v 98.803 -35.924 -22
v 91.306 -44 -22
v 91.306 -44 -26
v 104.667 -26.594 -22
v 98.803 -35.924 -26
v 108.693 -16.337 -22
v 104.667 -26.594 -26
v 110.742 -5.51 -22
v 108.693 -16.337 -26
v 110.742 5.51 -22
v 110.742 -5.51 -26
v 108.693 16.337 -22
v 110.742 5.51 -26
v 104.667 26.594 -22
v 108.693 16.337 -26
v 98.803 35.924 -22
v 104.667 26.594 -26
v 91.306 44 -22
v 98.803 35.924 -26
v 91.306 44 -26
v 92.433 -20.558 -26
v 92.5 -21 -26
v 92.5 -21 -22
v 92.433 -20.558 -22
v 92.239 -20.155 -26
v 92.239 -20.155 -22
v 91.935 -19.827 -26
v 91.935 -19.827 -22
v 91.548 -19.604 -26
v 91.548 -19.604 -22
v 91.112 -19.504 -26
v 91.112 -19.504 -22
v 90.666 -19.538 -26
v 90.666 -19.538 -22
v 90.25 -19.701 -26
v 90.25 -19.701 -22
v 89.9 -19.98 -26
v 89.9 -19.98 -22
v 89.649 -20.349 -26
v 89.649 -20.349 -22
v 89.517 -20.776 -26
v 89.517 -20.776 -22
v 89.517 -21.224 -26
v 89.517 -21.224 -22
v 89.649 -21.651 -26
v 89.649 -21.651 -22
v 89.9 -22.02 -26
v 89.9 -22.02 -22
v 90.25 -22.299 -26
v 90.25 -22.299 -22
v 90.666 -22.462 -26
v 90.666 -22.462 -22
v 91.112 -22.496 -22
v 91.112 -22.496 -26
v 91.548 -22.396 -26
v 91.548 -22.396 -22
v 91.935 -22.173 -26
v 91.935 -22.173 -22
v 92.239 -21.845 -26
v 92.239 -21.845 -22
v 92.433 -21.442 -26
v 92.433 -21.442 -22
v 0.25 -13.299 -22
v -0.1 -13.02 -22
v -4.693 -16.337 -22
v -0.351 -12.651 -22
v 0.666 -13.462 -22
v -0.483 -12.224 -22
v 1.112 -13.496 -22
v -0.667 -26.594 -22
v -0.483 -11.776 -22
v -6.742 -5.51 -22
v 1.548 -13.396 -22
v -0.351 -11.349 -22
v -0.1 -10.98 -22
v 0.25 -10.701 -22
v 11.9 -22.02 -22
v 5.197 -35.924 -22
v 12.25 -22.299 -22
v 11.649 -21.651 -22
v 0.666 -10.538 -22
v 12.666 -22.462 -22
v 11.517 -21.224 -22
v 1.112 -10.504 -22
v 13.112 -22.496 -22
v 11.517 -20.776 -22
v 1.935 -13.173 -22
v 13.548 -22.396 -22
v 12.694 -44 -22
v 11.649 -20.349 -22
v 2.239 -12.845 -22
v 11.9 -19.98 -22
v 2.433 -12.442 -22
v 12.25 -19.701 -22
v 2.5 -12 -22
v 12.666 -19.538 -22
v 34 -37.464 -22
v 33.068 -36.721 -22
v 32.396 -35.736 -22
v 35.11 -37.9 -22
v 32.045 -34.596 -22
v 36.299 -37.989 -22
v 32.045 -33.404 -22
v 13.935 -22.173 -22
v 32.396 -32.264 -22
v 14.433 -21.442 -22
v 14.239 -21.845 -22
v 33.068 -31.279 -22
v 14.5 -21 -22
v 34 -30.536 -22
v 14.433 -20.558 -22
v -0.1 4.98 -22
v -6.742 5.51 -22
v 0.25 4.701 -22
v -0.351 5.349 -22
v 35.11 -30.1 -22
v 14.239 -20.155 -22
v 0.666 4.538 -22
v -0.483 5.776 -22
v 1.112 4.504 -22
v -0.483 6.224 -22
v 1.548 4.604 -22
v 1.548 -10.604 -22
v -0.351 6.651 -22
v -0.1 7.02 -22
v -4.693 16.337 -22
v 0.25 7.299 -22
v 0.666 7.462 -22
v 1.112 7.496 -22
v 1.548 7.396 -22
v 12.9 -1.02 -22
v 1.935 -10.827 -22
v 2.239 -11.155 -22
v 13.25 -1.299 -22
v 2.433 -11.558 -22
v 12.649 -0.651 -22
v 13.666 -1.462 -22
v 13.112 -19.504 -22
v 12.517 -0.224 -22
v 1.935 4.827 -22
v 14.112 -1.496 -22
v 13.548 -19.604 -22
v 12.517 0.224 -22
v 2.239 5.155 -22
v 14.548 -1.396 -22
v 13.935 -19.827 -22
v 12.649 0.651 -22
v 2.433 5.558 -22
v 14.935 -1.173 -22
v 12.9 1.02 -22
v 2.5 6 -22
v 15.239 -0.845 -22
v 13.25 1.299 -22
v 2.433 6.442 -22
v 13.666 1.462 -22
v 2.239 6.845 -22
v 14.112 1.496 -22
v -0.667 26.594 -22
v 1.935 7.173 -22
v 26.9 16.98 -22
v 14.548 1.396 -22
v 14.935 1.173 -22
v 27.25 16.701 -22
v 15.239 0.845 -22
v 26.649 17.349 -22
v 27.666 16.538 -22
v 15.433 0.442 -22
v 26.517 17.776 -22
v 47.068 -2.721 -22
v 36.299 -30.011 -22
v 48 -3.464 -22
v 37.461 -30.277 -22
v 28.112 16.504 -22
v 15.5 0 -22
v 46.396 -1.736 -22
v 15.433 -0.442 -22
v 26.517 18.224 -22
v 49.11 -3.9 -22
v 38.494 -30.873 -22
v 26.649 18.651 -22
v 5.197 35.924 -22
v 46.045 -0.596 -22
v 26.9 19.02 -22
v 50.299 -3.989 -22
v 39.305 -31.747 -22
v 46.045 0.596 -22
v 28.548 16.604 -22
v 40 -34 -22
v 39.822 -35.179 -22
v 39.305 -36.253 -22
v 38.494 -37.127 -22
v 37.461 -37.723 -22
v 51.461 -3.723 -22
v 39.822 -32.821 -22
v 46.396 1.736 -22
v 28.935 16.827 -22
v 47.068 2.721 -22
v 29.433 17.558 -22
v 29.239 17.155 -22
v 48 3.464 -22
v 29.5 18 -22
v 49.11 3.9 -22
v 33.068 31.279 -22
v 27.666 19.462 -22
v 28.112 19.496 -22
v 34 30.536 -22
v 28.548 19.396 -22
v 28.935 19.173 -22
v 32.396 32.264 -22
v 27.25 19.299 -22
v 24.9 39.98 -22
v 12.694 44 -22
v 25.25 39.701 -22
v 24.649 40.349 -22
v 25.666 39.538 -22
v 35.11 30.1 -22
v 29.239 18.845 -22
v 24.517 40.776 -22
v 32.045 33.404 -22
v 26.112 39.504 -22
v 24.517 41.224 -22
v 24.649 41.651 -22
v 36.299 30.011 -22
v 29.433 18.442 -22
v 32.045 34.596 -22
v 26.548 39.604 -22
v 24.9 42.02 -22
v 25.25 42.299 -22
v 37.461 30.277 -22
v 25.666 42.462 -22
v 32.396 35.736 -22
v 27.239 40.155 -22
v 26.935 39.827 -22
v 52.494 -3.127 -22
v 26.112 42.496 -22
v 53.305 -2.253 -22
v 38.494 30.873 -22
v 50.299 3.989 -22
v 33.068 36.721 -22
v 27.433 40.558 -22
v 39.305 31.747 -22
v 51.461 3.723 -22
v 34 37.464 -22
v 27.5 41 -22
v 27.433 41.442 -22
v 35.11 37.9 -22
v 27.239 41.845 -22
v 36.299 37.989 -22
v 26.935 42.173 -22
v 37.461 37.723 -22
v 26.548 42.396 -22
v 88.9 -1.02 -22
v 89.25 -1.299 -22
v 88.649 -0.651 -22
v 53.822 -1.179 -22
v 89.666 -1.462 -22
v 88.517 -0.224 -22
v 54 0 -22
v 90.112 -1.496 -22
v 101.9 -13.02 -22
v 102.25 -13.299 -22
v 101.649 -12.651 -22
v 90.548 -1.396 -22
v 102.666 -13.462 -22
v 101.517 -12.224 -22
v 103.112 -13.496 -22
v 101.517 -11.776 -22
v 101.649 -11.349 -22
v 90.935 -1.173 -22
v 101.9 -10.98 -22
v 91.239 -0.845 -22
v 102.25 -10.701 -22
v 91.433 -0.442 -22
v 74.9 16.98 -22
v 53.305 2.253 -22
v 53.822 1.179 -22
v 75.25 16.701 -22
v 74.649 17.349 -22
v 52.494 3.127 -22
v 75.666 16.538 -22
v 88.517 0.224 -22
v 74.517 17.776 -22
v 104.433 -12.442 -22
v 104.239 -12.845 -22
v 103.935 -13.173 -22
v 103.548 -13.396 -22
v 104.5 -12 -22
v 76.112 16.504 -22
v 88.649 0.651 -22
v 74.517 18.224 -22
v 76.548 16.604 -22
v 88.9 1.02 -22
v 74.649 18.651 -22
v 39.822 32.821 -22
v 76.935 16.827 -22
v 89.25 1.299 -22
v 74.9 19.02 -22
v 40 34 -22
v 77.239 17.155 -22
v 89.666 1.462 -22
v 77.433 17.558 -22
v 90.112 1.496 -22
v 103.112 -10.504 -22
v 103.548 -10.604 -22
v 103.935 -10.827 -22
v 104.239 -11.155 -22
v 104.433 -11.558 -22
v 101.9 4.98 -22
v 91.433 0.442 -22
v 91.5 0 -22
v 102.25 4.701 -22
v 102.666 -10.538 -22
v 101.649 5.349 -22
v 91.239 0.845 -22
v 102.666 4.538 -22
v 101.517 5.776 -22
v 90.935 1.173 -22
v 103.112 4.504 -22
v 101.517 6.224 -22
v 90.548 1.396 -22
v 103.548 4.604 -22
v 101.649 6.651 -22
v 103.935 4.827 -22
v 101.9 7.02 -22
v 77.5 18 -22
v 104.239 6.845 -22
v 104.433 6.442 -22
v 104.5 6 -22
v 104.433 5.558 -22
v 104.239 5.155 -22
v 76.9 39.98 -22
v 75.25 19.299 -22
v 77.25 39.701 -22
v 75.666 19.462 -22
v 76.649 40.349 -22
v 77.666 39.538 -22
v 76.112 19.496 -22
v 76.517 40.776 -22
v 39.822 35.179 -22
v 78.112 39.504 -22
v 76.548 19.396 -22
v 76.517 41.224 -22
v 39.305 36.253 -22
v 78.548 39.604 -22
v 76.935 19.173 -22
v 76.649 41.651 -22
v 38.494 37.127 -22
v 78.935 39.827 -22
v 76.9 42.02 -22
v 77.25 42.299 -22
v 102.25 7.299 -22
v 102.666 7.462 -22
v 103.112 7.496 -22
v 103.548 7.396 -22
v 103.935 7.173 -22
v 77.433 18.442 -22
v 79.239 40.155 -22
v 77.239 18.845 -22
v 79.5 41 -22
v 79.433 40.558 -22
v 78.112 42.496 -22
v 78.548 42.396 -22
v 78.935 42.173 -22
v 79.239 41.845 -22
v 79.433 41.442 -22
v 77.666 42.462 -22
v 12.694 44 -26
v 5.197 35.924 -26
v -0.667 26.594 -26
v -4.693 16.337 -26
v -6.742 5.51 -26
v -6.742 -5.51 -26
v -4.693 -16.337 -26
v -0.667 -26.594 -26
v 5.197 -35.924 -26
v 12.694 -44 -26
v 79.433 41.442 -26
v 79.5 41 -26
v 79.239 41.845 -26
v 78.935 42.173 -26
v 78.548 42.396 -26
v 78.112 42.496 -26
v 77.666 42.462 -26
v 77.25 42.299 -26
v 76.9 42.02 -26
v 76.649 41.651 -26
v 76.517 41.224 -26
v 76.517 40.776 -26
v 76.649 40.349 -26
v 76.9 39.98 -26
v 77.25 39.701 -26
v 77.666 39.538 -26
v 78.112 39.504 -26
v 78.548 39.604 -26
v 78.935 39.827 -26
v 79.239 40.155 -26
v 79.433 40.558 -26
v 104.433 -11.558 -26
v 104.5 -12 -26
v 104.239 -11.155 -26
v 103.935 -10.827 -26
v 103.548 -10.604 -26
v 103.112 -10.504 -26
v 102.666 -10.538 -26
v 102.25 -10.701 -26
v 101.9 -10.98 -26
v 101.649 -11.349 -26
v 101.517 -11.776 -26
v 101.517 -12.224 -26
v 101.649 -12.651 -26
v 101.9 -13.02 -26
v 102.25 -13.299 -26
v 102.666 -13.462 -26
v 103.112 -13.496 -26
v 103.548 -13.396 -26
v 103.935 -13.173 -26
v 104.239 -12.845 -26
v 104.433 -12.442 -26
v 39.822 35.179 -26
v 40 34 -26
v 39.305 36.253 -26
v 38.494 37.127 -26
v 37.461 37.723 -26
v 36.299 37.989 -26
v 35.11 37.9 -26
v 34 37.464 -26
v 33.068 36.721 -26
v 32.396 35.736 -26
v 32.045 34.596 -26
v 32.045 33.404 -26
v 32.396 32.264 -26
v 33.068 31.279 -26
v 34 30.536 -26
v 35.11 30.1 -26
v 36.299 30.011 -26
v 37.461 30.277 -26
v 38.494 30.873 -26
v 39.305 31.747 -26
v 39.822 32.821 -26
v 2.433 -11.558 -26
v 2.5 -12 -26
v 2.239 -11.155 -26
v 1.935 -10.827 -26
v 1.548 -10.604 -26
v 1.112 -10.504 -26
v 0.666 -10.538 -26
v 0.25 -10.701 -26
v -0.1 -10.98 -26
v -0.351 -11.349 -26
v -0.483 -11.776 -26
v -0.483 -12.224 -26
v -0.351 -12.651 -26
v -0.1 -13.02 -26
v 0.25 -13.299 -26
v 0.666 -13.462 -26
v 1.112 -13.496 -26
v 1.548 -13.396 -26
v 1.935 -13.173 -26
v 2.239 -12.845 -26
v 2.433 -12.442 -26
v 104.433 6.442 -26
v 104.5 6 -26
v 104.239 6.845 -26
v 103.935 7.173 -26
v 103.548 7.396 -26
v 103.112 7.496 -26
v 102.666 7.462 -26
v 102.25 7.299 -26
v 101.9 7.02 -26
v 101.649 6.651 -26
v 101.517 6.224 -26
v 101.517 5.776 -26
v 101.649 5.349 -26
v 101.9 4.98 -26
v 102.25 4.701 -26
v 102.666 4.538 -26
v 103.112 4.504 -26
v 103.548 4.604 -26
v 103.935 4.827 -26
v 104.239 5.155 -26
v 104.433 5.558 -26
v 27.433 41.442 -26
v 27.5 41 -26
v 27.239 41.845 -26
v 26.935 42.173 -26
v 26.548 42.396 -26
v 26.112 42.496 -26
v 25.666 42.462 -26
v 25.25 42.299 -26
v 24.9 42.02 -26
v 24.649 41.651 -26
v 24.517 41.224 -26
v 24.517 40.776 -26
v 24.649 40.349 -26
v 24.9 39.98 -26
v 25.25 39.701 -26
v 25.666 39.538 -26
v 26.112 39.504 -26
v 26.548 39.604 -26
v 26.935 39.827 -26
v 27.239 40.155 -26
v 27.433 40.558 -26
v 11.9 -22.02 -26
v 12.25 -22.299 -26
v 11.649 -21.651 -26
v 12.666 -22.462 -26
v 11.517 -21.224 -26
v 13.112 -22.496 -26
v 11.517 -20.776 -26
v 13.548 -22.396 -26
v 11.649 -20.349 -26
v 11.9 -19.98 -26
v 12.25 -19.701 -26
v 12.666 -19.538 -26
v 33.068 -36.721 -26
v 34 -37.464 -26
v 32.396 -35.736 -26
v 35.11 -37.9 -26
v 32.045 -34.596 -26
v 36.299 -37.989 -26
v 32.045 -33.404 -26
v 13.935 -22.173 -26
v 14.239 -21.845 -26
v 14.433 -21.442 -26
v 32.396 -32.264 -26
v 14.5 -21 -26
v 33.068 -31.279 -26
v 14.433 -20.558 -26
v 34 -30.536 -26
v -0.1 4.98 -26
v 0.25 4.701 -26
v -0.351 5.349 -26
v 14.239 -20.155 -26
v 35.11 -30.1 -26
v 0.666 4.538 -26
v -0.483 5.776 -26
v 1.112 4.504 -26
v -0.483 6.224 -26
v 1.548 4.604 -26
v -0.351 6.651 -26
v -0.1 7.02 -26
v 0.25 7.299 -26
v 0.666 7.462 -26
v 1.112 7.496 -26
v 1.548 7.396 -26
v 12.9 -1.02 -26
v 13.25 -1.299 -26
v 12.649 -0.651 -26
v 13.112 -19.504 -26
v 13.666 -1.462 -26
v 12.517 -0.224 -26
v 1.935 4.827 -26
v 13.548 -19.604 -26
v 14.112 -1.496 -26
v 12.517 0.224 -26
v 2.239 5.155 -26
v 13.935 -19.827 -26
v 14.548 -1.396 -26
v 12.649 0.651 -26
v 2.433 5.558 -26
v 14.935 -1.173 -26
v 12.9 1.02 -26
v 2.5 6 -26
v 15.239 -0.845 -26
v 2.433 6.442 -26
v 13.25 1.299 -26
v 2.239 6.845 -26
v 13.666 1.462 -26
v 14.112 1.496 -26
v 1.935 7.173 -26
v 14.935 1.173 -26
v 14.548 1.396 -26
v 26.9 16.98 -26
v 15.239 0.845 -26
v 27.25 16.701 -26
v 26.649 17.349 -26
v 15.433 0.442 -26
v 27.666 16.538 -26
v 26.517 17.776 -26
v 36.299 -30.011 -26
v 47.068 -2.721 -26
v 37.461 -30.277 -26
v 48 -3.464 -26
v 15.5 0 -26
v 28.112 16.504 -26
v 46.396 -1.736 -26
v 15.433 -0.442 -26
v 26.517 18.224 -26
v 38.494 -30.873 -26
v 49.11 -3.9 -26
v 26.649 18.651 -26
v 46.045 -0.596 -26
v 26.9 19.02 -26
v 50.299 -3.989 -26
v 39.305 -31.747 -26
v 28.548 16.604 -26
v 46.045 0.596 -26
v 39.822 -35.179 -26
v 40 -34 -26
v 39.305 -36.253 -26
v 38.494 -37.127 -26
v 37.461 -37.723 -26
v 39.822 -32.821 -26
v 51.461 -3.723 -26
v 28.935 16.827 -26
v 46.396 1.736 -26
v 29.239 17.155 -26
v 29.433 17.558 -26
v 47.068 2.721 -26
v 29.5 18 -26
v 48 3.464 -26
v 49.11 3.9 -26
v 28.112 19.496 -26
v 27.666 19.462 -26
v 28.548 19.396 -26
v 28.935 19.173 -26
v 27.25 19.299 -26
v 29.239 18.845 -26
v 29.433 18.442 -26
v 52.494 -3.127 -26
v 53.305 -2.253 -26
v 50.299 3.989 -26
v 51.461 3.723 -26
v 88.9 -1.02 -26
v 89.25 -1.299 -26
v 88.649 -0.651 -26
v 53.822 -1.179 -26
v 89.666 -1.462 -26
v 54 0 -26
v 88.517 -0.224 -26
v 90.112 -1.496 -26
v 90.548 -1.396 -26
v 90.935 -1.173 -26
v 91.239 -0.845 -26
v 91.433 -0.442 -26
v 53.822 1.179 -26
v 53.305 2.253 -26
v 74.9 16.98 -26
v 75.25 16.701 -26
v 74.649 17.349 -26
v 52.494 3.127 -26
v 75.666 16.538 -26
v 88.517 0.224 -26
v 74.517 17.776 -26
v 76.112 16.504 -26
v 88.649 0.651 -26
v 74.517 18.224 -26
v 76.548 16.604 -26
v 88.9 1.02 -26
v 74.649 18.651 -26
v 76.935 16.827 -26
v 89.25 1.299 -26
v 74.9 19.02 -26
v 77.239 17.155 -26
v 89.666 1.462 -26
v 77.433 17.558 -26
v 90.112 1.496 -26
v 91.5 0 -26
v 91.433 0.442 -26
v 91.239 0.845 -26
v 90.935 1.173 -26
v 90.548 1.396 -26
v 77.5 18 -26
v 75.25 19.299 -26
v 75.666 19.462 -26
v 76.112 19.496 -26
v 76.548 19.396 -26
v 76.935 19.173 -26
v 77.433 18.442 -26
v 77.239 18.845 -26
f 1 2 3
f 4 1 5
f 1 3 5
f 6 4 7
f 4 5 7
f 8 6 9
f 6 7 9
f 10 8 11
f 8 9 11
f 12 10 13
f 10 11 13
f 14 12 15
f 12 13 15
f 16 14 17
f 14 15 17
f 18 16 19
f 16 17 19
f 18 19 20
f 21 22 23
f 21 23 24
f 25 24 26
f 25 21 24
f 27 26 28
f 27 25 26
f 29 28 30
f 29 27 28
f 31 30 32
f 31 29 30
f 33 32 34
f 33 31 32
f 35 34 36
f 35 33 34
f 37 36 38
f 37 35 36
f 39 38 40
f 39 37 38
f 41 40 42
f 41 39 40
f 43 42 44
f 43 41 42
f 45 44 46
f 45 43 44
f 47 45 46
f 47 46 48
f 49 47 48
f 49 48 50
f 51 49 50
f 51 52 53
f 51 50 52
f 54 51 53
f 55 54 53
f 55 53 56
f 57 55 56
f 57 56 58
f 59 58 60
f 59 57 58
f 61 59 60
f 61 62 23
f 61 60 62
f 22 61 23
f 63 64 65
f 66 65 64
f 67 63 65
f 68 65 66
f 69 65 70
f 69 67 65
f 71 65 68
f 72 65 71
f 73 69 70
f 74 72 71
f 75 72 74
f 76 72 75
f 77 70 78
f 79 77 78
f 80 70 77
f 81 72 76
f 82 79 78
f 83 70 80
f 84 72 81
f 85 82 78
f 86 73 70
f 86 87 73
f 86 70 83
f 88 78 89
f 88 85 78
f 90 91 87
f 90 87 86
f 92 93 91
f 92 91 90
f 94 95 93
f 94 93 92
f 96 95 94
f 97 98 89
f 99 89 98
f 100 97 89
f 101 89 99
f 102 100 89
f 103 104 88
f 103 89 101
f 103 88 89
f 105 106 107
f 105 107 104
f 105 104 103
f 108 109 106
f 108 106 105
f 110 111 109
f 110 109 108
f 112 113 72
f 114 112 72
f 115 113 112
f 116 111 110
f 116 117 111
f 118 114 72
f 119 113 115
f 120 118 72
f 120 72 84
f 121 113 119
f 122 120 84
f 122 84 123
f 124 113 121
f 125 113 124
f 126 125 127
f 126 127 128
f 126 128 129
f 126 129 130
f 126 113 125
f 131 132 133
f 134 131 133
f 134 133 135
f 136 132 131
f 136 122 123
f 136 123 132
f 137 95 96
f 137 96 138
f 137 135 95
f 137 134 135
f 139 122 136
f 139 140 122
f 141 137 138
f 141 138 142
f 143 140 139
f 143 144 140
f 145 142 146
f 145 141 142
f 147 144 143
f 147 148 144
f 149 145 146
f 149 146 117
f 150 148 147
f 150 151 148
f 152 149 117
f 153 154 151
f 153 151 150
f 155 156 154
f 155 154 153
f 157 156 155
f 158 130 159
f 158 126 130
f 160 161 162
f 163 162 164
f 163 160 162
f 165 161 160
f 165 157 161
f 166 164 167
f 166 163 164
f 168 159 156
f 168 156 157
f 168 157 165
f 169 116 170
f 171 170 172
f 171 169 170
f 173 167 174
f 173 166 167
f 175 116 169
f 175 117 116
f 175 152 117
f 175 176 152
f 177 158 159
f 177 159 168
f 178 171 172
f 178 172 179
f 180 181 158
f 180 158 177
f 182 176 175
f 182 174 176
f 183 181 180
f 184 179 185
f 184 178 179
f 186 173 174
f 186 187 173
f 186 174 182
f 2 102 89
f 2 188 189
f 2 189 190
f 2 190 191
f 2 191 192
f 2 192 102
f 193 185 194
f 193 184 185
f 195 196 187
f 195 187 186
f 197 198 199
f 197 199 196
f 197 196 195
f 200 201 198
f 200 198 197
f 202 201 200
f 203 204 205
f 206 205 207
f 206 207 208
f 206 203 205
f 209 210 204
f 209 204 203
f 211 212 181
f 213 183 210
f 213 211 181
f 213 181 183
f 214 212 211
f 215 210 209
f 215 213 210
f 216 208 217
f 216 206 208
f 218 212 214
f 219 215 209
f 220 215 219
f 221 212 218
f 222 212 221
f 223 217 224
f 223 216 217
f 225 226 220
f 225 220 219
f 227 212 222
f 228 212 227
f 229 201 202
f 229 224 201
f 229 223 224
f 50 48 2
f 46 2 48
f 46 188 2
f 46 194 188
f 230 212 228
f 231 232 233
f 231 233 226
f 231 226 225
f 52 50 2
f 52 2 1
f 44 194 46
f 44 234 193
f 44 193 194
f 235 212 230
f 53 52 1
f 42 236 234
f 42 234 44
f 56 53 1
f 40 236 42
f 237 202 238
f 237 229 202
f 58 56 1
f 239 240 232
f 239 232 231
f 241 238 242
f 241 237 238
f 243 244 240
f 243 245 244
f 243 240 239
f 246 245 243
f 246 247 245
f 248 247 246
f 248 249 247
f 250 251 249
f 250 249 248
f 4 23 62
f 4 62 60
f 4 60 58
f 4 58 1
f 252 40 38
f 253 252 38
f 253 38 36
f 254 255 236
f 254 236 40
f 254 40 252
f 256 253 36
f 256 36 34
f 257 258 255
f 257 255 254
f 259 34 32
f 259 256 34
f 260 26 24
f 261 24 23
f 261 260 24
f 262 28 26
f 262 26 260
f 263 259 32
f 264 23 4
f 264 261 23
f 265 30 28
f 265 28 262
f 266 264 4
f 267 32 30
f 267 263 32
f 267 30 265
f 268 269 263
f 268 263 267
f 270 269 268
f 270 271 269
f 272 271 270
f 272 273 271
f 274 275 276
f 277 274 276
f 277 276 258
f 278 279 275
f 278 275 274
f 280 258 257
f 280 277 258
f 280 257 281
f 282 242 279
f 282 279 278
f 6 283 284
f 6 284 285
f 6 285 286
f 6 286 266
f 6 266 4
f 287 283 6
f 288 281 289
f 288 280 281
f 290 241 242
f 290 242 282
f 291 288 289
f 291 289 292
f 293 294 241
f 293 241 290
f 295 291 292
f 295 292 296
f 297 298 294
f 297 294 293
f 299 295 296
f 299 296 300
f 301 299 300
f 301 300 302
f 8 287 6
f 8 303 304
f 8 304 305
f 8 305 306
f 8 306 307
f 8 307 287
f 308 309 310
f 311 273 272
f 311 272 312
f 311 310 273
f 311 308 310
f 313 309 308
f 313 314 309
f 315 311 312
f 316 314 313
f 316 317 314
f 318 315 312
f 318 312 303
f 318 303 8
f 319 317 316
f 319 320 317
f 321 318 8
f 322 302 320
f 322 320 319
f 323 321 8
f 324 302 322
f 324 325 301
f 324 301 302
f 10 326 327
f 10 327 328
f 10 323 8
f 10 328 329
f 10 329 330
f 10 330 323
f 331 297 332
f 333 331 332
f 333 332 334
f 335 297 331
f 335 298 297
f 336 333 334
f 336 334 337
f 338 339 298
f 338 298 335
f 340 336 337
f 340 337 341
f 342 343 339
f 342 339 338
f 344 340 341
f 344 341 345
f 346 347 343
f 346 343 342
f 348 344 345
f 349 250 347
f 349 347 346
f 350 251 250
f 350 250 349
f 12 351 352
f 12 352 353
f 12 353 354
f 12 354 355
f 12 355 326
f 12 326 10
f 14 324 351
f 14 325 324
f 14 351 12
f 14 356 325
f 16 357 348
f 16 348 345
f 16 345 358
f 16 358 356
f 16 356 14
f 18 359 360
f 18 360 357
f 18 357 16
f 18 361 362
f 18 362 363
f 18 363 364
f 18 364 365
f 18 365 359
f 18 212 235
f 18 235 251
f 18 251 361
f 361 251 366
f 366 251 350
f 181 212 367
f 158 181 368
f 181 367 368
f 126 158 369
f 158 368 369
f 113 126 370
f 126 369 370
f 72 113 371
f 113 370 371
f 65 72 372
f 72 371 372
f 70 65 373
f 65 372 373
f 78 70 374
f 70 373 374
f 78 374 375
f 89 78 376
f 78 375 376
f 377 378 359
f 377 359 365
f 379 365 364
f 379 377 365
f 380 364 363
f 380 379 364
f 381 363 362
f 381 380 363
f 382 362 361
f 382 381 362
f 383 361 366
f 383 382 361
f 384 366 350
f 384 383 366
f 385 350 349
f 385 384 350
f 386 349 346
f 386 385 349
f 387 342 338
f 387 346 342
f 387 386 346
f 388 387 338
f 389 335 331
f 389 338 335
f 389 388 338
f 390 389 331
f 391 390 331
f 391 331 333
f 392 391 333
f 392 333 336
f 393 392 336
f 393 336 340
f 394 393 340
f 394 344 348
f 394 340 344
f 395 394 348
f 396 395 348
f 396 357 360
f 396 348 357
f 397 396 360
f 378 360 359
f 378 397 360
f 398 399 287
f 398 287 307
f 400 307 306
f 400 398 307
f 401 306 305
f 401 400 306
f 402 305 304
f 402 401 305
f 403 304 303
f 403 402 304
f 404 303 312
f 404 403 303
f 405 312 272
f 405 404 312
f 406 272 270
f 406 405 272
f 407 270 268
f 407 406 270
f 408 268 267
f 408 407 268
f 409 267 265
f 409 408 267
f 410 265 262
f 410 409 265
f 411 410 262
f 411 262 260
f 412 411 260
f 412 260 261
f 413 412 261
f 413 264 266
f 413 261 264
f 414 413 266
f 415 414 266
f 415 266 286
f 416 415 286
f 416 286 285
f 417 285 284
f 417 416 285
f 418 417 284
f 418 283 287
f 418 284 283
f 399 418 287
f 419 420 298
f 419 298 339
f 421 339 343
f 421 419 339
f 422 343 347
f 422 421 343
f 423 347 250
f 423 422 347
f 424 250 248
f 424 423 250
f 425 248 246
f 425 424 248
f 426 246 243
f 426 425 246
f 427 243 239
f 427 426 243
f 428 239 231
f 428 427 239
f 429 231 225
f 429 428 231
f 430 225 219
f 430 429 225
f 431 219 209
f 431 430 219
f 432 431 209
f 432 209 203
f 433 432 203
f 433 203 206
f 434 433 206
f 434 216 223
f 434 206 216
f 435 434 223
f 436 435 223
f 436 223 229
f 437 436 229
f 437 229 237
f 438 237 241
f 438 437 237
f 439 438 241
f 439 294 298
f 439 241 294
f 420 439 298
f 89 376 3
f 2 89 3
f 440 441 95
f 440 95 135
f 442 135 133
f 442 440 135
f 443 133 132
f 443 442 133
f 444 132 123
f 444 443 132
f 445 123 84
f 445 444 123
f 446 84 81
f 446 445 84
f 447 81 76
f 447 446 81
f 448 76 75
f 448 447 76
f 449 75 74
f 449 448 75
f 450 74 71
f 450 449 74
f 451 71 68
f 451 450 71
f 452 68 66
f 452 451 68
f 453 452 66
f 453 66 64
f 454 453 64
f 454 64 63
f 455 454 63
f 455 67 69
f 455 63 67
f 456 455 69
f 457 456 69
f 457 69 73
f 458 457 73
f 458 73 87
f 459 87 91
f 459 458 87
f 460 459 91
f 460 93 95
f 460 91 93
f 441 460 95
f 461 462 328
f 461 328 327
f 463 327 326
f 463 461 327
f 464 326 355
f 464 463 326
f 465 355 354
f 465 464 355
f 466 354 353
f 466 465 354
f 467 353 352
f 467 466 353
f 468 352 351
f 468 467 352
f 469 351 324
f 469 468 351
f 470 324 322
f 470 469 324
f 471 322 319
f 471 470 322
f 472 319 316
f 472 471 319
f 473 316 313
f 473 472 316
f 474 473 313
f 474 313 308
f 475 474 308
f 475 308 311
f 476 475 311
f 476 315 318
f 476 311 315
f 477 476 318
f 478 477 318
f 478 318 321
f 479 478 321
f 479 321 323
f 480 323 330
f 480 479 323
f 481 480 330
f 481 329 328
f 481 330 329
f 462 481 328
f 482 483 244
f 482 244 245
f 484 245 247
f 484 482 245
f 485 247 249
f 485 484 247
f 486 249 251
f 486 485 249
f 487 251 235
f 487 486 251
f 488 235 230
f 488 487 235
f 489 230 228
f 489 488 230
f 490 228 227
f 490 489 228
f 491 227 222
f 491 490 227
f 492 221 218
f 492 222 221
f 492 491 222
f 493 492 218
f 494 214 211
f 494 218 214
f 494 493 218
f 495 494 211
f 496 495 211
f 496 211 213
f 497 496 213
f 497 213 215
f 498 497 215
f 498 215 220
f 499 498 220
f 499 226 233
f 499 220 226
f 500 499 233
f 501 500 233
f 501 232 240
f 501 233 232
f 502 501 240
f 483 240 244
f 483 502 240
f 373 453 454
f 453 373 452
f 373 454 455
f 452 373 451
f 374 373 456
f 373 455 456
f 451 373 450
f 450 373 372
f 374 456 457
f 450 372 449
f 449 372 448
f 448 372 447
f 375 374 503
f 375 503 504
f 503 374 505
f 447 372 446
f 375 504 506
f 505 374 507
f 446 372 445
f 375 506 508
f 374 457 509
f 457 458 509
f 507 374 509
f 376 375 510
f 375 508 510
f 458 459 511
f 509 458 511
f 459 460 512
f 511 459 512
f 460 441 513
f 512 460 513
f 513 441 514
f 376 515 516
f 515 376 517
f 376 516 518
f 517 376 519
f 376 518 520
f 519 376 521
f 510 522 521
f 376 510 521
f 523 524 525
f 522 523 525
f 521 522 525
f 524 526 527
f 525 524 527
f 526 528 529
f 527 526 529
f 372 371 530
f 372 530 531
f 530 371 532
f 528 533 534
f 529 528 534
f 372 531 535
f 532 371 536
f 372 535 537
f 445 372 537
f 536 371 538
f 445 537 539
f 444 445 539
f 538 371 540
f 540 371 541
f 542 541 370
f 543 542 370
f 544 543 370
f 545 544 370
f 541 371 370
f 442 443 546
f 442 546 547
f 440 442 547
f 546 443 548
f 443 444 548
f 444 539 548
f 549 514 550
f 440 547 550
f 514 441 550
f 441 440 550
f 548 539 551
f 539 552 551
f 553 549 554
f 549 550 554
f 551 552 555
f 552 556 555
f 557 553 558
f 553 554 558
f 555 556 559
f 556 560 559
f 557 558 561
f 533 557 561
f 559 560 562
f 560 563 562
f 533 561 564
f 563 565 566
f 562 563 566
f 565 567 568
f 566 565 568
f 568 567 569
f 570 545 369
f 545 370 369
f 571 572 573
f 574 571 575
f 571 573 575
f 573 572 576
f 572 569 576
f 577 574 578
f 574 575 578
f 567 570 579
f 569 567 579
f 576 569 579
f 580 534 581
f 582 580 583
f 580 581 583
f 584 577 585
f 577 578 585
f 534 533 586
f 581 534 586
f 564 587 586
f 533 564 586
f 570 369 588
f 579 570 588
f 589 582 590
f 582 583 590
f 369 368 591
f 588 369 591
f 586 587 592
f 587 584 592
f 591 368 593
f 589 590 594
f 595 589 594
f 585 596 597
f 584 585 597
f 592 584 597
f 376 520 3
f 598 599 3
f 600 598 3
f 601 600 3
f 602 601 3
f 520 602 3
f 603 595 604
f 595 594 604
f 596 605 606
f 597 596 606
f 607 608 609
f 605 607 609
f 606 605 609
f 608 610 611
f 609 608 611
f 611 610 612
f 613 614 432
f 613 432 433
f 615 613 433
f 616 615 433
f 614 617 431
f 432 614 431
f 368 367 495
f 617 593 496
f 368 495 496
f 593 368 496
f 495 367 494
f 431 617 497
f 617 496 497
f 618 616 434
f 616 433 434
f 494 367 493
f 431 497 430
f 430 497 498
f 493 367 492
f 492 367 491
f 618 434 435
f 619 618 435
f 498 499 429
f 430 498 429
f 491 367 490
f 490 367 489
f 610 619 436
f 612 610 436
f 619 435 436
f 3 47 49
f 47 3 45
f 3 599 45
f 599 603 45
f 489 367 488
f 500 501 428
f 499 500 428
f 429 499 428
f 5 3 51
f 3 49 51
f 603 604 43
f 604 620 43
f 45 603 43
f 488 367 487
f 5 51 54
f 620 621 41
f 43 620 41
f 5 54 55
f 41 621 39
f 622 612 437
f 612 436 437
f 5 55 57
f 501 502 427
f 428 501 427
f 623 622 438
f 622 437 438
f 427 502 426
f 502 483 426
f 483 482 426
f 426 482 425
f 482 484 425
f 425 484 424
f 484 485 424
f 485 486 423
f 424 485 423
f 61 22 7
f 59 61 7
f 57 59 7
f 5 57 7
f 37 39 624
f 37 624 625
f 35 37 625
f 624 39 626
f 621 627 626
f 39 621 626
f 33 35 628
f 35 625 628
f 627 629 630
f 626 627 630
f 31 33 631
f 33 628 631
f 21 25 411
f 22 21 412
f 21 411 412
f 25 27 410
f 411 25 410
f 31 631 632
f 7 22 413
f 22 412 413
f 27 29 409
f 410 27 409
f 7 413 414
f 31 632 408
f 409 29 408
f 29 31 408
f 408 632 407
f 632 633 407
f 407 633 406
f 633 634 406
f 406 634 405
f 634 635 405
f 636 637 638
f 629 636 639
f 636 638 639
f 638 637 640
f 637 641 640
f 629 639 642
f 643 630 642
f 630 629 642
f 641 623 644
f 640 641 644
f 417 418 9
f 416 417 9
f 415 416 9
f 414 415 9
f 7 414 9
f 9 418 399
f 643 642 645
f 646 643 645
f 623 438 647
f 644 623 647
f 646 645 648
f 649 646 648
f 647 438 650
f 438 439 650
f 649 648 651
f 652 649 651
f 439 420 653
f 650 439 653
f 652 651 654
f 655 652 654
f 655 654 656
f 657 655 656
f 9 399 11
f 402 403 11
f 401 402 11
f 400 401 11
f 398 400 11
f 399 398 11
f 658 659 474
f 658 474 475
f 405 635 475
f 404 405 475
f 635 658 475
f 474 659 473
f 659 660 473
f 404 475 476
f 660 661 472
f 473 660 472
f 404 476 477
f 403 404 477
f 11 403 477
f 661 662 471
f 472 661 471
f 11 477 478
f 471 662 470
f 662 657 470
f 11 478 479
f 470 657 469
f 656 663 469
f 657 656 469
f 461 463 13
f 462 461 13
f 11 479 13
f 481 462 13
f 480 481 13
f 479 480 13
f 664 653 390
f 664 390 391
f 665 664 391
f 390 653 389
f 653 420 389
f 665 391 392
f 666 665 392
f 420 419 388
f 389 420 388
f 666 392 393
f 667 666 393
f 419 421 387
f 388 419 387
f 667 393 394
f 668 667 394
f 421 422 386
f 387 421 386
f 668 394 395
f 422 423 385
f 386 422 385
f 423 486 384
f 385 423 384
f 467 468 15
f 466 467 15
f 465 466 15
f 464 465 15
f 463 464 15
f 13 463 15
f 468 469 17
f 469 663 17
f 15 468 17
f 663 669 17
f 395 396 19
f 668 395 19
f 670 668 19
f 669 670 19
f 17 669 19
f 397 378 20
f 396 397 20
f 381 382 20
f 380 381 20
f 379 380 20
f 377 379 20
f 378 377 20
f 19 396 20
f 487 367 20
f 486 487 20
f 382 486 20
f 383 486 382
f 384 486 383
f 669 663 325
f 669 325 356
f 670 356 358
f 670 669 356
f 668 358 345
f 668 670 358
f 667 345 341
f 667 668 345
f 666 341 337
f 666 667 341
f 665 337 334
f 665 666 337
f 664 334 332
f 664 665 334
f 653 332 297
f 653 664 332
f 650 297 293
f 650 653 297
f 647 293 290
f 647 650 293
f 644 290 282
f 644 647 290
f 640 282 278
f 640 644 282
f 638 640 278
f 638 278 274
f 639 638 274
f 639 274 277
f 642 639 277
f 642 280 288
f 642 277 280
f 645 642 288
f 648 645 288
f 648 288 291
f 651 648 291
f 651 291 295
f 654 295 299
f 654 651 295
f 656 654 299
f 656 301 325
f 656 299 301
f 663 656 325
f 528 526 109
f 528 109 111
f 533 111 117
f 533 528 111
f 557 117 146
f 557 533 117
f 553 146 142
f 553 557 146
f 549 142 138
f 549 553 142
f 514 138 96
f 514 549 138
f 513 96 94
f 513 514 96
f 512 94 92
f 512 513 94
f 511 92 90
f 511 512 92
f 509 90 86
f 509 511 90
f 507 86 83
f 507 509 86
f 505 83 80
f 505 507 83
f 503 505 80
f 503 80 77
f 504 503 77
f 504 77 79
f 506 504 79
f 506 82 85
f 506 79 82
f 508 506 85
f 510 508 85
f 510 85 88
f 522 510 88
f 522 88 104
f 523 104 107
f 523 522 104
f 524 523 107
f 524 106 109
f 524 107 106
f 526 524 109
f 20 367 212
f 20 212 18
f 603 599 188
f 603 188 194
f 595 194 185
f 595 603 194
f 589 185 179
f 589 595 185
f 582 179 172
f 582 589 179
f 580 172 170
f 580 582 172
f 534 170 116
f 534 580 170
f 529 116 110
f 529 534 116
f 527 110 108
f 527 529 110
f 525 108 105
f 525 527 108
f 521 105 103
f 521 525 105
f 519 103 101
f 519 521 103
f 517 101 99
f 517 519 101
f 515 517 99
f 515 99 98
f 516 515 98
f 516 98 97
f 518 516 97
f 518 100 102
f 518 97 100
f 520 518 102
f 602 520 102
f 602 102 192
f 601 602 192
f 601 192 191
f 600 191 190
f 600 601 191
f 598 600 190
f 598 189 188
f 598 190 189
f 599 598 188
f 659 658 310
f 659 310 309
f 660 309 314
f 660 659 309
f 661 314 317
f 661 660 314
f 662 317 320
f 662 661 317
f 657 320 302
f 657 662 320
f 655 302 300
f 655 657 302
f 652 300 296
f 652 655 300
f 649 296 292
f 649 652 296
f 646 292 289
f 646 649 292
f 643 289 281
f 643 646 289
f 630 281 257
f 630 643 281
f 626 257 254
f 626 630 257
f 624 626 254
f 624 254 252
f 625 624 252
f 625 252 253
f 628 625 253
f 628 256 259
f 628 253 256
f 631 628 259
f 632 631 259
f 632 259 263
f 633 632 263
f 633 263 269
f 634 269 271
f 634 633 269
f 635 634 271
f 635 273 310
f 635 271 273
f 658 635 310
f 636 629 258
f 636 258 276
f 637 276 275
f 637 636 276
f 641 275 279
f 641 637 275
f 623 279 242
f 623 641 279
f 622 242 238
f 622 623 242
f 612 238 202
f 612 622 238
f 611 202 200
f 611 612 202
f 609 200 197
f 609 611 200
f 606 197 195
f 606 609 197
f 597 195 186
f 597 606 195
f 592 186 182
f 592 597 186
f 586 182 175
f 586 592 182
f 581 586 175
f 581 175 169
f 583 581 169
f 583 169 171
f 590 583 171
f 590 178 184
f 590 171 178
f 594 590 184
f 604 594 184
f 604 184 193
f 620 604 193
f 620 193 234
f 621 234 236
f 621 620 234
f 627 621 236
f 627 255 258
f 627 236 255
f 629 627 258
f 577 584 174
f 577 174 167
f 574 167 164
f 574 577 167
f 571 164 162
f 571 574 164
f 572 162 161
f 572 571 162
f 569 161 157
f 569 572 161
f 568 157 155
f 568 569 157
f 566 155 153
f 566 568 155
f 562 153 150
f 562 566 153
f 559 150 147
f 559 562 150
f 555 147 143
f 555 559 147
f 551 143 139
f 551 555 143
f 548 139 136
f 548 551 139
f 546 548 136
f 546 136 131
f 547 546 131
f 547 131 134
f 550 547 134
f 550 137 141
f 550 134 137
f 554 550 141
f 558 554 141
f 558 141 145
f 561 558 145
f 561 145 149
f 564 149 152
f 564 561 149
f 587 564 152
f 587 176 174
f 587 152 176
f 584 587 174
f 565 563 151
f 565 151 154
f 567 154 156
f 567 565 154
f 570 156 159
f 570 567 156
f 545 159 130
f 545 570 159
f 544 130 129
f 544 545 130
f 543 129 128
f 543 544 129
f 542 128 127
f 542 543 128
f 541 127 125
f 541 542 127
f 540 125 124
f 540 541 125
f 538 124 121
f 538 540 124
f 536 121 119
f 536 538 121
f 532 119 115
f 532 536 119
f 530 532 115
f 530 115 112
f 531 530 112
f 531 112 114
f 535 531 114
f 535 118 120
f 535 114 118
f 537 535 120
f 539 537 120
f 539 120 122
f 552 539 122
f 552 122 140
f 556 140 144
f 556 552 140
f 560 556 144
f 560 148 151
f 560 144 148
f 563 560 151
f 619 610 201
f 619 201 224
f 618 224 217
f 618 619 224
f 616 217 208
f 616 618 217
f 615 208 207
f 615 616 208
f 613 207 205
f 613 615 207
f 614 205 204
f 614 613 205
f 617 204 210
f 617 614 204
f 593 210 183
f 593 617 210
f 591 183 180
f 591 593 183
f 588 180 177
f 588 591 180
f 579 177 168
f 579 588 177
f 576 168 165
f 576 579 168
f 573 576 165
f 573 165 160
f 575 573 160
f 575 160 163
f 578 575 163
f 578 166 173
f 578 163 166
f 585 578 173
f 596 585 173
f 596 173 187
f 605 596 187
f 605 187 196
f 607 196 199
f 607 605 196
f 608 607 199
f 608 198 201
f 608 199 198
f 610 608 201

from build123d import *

# Parameters (mm, degrees)
CYLINDER1271_R     = 1.5
CYLINDER1271_DEPTH = 100
CYLINDER1270_R     = 1.5
CYLINDER1270_DEPTH = 100
CYLINDER1269_R     = 1.5
CYLINDER1269_DEPTH = 32
CYLINDER1268_R     = 1.5
CYLINDER1268_DEPTH = 32
BOX235_W           = 200
BOX235_H           = 100
BOX235_DEPTH       = 100
BOX233_W           = 200
BOX233_H           = 100
BOX233_DEPTH       = 100
CYLINDER1127_R     = 4
CYLINDER1127_DEPTH = 100
CYLINDER1128_R     = 4
CYLINDER1128_DEPTH = 100
CYLINDER1129_R     = 4
CYLINDER1129_DEPTH = 100
CYLINDER1125_R     = 4
CYLINDER1125_DEPTH = 100
CYLINDER1130_R     = 4
CYLINDER1130_DEPTH = 100
CYLINDER1126_R     = 4
CYLINDER1126_DEPTH = 100
CYLINDER1102_R     = 1.5
CYLINDER1102_DEPTH = 100
CYLINDER1103_R     = 1.5
CYLINDER1103_DEPTH = 100
CYLINDER1104_R     = 1.5
CYLINDER1104_DEPTH = 100
CYLINDER1105_R     = 1.5
CYLINDER1105_DEPTH = 100
CYLINDER1106_R     = 1.5
CYLINDER1106_DEPTH = 100
CYLINDER1107_R     = 1.5
CYLINDER1107_DEPTH = 100
CYLINDER1108_R     = 1.5
CYLINDER1108_DEPTH = 100
CYLINDER1101_R     = 1.5
CYLINDER1101_DEPTH = 100
CYLINDER1092_R     = 59
CYLINDER1092_DEPTH = 4


with BuildPart() as v_lec1271:
    # Cylinder1271 → Cylinder1271 (new body)
    with BuildSketch(Plane(origin=(14, 0, -60), x_dir=(1, 0, 0), z_dir=(0, 0, 1))):
        Circle(CYLINDER1271_R)
    extrude(amount=CYLINDER1271_DEPTH)


with BuildPart() as srouby_troj005:
    # Cylinder1270 → Cylinder1270 (new body)
    with BuildSketch(Plane(origin=(90, 0, -60), x_dir=(1, 0, 0), z_dir=(0, 0, 1))):
        Circle(CYLINDER1270_R)
    extrude(amount=CYLINDER1270_DEPTH)

    # Compound834: union Válec1271
    add(v_lec1271.part)


with BuildPart() as v_lec1269:
    # Cylinder1269 → Cylinder1269 (new body)
    with BuildSketch(Plane(origin=(78, 41, -42), x_dir=(1, 0, 0), z_dir=(0, 0, 1))):
        Circle(CYLINDER1269_R)
    extrude(amount=CYLINDER1269_DEPTH)


with BuildPart() as compound833:
    # Cylinder1268 → Cylinder1268 (new body)
    with BuildSketch(Plane(origin=(26, 41, -42), x_dir=(1, 0, 0), z_dir=(0, 0, 1))):
        Circle(CYLINDER1268_R)
    extrude(amount=CYLINDER1268_DEPTH)

    # Compound833: union Válec1269
    add(v_lec1269.part)


with BuildPart() as krychle235:
    # Box235 → Box235 (new body)
    with BuildSketch(Plane(origin=(-60, 44, -90), x_dir=(1, 0, 0), z_dir=(0, 0, 1))):
        with Locations((100, 50)):
            Rectangle(BOX235_W, BOX235_H)
    extrude(amount=BOX235_DEPTH)


with BuildPart() as krychle233:
    # Box233 → Box233 (new body)
    with BuildSketch(Plane(origin=(-60, -144, -90), x_dir=(1, 0, 0), z_dir=(0, 0, 1))):
        with Locations((100, 50)):
            Rectangle(BOX233_W, BOX233_H)
    extrude(amount=BOX233_DEPTH)


with BuildPart() as v_lec1127:
    # Cylinder1127 → Cylinder1127 (new body)
    with BuildSketch(Plane(origin=(-36, 34, -90), x_dir=(1, 0, 0), z_dir=(0, 0, 1))):
        Circle(CYLINDER1127_R)
    extrude(amount=CYLINDER1127_DEPTH)


with BuildPart() as v_lec1128:
    # Cylinder1128 → Cylinder1128 (new body)
    with BuildSketch(Plane(origin=(-36, -34, -90), x_dir=(1, 0, 0), z_dir=(0, 0, 1))):
        Circle(CYLINDER1128_R)
    extrude(amount=CYLINDER1128_DEPTH)


with BuildPart() as v_lec1129:
    # Cylinder1129 → Cylinder1129 (new body)
    with BuildSketch(Plane(origin=(50, 0, -90), x_dir=(1, 0, 0), z_dir=(0, 0, 1))):
        Circle(CYLINDER1129_R)
    extrude(amount=CYLINDER1129_DEPTH)


with BuildPart() as v_lec1125:
    # Cylinder1125 → Cylinder1125 (new body)
    with BuildSketch(Plane(origin=(36, 34, -90), x_dir=(1, 0, 0), z_dir=(0, 0, 1))):
        Circle(CYLINDER1125_R)
    extrude(amount=CYLINDER1125_DEPTH)


with BuildPart() as v_lec1130:
    # Cylinder1130 → Cylinder1130 (new body)
    with BuildSketch(Plane(origin=(36, -34, -90), x_dir=(1, 0, 0), z_dir=(0, 0, 1))):
        Circle(CYLINDER1130_R)
    extrude(amount=CYLINDER1130_DEPTH)


with BuildPart() as sbouby_baze_silne:
    # Cylinder1126 → Cylinder1126 (new body)
    with BuildSketch(Plane(origin=(-50, 0, -90), x_dir=(1, 0, 0), z_dir=(0, 0, 1))):
        Circle(CYLINDER1126_R)
    extrude(amount=CYLINDER1126_DEPTH)

    # Compound565: union Válec1127, Válec1128, Válec1129, Válec1125, Válec1130
    add(v_lec1127.part)
    add(v_lec1128.part)
    add(v_lec1129.part)
    add(v_lec1125.part)
    add(v_lec1130.part)


with BuildPart() as v_lec1102:
    # Cylinder1102 → Cylinder1102 (new body)
    with BuildSketch(Plane(origin=(103, 6, -60), x_dir=(1, 0, 0), z_dir=(0, 0, 1))):
        Circle(CYLINDER1102_R)
    extrude(amount=CYLINDER1102_DEPTH)


with BuildPart() as v_lec1103:
    # Cylinder1103 → Cylinder1103 (new body)
    with BuildSketch(Plane(origin=(76, 18, -60), x_dir=(1, 0, 0), z_dir=(0, 0, 1))):
        Circle(CYLINDER1103_R)
    extrude(amount=CYLINDER1103_DEPTH)


with BuildPart() as v_lec1104:
    # Cylinder1104 → Cylinder1104 (new body)
    with BuildSketch(Plane(origin=(91, -21, -60), x_dir=(1, 0, 0), z_dir=(0, 0, 1))):
        Circle(CYLINDER1104_R)
    extrude(amount=CYLINDER1104_DEPTH)


with BuildPart() as v_lec1105:
    # Cylinder1105 → Cylinder1105 (new body)
    with BuildSketch(Plane(origin=(13, -21, -60), x_dir=(1, 0, 0), z_dir=(0, 0, 1))):
        Circle(CYLINDER1105_R)
    extrude(amount=CYLINDER1105_DEPTH)


with BuildPart() as v_lec1106:
    # Cylinder1106 → Cylinder1106 (new body)
    with BuildSketch(Plane(origin=(28, 18, -60), x_dir=(1, 0, 0), z_dir=(0, 0, 1))):
        Circle(CYLINDER1106_R)
    extrude(amount=CYLINDER1106_DEPTH)


with BuildPart() as v_lec1107:
    # Cylinder1107 → Cylinder1107 (new body)
    with BuildSketch(Plane(origin=(1, -12, -60), x_dir=(1, 0, 0), z_dir=(0, 0, 1))):
        Circle(CYLINDER1107_R)
    extrude(amount=CYLINDER1107_DEPTH)


with BuildPart() as v_lec1108:
    # Cylinder1108 → Cylinder1108 (new body)
    with BuildSketch(Plane(origin=(1, 6, -60), x_dir=(1, 0, 0), z_dir=(0, 0, 1))):
        Circle(CYLINDER1108_R)
    extrude(amount=CYLINDER1108_DEPTH)


with BuildPart() as srouby_monoblok001:
    # Cylinder1101 → Cylinder1101 (new body)
    with BuildSketch(Plane(origin=(103, -12, -60), x_dir=(1, 0, 0), z_dir=(0, 0, 1))):
        Circle(CYLINDER1101_R)
    extrude(amount=CYLINDER1101_DEPTH)

    # Compound562: union Válec1102, Válec1103, Válec1104, Válec1105, Válec1106, Válec1107, Válec1108
    add(v_lec1102.part)
    add(v_lec1103.part)
    add(v_lec1104.part)
    add(v_lec1105.part)
    add(v_lec1106.part)
    add(v_lec1107.part)
    add(v_lec1108.part)


with BuildPart() as cut291:
    # Cylinder1092 → Cylinder1092 (new body)
    with BuildSketch(Plane(origin=(52, 0, -26), x_dir=(1, 0, 0), z_dir=(0, 0, 1))):
        Circle(CYLINDER1092_R)
    extrude(amount=CYLINDER1092_DEPTH)

    # Cut250: cut srouby_monoblok001
    add(srouby_monoblok001.part, mode=Mode.SUBTRACT)

    # Cut251: cut sbouby_baze_silne
    add(sbouby_baze_silne.part, mode=Mode.SUBTRACT)

    # Cut285: cut Krychle233
    add(krychle233.part, mode=Mode.SUBTRACT)

    # Cut287: cut Krychle235
    add(krychle235.part, mode=Mode.SUBTRACT)

    # Cut288: cut Compound833
    add(compound833.part, mode=Mode.SUBTRACT)

    # Cut291: cut srouby_troj005
    add(srouby_troj005.part, mode=Mode.SUBTRACT)


solid = cut291.part
